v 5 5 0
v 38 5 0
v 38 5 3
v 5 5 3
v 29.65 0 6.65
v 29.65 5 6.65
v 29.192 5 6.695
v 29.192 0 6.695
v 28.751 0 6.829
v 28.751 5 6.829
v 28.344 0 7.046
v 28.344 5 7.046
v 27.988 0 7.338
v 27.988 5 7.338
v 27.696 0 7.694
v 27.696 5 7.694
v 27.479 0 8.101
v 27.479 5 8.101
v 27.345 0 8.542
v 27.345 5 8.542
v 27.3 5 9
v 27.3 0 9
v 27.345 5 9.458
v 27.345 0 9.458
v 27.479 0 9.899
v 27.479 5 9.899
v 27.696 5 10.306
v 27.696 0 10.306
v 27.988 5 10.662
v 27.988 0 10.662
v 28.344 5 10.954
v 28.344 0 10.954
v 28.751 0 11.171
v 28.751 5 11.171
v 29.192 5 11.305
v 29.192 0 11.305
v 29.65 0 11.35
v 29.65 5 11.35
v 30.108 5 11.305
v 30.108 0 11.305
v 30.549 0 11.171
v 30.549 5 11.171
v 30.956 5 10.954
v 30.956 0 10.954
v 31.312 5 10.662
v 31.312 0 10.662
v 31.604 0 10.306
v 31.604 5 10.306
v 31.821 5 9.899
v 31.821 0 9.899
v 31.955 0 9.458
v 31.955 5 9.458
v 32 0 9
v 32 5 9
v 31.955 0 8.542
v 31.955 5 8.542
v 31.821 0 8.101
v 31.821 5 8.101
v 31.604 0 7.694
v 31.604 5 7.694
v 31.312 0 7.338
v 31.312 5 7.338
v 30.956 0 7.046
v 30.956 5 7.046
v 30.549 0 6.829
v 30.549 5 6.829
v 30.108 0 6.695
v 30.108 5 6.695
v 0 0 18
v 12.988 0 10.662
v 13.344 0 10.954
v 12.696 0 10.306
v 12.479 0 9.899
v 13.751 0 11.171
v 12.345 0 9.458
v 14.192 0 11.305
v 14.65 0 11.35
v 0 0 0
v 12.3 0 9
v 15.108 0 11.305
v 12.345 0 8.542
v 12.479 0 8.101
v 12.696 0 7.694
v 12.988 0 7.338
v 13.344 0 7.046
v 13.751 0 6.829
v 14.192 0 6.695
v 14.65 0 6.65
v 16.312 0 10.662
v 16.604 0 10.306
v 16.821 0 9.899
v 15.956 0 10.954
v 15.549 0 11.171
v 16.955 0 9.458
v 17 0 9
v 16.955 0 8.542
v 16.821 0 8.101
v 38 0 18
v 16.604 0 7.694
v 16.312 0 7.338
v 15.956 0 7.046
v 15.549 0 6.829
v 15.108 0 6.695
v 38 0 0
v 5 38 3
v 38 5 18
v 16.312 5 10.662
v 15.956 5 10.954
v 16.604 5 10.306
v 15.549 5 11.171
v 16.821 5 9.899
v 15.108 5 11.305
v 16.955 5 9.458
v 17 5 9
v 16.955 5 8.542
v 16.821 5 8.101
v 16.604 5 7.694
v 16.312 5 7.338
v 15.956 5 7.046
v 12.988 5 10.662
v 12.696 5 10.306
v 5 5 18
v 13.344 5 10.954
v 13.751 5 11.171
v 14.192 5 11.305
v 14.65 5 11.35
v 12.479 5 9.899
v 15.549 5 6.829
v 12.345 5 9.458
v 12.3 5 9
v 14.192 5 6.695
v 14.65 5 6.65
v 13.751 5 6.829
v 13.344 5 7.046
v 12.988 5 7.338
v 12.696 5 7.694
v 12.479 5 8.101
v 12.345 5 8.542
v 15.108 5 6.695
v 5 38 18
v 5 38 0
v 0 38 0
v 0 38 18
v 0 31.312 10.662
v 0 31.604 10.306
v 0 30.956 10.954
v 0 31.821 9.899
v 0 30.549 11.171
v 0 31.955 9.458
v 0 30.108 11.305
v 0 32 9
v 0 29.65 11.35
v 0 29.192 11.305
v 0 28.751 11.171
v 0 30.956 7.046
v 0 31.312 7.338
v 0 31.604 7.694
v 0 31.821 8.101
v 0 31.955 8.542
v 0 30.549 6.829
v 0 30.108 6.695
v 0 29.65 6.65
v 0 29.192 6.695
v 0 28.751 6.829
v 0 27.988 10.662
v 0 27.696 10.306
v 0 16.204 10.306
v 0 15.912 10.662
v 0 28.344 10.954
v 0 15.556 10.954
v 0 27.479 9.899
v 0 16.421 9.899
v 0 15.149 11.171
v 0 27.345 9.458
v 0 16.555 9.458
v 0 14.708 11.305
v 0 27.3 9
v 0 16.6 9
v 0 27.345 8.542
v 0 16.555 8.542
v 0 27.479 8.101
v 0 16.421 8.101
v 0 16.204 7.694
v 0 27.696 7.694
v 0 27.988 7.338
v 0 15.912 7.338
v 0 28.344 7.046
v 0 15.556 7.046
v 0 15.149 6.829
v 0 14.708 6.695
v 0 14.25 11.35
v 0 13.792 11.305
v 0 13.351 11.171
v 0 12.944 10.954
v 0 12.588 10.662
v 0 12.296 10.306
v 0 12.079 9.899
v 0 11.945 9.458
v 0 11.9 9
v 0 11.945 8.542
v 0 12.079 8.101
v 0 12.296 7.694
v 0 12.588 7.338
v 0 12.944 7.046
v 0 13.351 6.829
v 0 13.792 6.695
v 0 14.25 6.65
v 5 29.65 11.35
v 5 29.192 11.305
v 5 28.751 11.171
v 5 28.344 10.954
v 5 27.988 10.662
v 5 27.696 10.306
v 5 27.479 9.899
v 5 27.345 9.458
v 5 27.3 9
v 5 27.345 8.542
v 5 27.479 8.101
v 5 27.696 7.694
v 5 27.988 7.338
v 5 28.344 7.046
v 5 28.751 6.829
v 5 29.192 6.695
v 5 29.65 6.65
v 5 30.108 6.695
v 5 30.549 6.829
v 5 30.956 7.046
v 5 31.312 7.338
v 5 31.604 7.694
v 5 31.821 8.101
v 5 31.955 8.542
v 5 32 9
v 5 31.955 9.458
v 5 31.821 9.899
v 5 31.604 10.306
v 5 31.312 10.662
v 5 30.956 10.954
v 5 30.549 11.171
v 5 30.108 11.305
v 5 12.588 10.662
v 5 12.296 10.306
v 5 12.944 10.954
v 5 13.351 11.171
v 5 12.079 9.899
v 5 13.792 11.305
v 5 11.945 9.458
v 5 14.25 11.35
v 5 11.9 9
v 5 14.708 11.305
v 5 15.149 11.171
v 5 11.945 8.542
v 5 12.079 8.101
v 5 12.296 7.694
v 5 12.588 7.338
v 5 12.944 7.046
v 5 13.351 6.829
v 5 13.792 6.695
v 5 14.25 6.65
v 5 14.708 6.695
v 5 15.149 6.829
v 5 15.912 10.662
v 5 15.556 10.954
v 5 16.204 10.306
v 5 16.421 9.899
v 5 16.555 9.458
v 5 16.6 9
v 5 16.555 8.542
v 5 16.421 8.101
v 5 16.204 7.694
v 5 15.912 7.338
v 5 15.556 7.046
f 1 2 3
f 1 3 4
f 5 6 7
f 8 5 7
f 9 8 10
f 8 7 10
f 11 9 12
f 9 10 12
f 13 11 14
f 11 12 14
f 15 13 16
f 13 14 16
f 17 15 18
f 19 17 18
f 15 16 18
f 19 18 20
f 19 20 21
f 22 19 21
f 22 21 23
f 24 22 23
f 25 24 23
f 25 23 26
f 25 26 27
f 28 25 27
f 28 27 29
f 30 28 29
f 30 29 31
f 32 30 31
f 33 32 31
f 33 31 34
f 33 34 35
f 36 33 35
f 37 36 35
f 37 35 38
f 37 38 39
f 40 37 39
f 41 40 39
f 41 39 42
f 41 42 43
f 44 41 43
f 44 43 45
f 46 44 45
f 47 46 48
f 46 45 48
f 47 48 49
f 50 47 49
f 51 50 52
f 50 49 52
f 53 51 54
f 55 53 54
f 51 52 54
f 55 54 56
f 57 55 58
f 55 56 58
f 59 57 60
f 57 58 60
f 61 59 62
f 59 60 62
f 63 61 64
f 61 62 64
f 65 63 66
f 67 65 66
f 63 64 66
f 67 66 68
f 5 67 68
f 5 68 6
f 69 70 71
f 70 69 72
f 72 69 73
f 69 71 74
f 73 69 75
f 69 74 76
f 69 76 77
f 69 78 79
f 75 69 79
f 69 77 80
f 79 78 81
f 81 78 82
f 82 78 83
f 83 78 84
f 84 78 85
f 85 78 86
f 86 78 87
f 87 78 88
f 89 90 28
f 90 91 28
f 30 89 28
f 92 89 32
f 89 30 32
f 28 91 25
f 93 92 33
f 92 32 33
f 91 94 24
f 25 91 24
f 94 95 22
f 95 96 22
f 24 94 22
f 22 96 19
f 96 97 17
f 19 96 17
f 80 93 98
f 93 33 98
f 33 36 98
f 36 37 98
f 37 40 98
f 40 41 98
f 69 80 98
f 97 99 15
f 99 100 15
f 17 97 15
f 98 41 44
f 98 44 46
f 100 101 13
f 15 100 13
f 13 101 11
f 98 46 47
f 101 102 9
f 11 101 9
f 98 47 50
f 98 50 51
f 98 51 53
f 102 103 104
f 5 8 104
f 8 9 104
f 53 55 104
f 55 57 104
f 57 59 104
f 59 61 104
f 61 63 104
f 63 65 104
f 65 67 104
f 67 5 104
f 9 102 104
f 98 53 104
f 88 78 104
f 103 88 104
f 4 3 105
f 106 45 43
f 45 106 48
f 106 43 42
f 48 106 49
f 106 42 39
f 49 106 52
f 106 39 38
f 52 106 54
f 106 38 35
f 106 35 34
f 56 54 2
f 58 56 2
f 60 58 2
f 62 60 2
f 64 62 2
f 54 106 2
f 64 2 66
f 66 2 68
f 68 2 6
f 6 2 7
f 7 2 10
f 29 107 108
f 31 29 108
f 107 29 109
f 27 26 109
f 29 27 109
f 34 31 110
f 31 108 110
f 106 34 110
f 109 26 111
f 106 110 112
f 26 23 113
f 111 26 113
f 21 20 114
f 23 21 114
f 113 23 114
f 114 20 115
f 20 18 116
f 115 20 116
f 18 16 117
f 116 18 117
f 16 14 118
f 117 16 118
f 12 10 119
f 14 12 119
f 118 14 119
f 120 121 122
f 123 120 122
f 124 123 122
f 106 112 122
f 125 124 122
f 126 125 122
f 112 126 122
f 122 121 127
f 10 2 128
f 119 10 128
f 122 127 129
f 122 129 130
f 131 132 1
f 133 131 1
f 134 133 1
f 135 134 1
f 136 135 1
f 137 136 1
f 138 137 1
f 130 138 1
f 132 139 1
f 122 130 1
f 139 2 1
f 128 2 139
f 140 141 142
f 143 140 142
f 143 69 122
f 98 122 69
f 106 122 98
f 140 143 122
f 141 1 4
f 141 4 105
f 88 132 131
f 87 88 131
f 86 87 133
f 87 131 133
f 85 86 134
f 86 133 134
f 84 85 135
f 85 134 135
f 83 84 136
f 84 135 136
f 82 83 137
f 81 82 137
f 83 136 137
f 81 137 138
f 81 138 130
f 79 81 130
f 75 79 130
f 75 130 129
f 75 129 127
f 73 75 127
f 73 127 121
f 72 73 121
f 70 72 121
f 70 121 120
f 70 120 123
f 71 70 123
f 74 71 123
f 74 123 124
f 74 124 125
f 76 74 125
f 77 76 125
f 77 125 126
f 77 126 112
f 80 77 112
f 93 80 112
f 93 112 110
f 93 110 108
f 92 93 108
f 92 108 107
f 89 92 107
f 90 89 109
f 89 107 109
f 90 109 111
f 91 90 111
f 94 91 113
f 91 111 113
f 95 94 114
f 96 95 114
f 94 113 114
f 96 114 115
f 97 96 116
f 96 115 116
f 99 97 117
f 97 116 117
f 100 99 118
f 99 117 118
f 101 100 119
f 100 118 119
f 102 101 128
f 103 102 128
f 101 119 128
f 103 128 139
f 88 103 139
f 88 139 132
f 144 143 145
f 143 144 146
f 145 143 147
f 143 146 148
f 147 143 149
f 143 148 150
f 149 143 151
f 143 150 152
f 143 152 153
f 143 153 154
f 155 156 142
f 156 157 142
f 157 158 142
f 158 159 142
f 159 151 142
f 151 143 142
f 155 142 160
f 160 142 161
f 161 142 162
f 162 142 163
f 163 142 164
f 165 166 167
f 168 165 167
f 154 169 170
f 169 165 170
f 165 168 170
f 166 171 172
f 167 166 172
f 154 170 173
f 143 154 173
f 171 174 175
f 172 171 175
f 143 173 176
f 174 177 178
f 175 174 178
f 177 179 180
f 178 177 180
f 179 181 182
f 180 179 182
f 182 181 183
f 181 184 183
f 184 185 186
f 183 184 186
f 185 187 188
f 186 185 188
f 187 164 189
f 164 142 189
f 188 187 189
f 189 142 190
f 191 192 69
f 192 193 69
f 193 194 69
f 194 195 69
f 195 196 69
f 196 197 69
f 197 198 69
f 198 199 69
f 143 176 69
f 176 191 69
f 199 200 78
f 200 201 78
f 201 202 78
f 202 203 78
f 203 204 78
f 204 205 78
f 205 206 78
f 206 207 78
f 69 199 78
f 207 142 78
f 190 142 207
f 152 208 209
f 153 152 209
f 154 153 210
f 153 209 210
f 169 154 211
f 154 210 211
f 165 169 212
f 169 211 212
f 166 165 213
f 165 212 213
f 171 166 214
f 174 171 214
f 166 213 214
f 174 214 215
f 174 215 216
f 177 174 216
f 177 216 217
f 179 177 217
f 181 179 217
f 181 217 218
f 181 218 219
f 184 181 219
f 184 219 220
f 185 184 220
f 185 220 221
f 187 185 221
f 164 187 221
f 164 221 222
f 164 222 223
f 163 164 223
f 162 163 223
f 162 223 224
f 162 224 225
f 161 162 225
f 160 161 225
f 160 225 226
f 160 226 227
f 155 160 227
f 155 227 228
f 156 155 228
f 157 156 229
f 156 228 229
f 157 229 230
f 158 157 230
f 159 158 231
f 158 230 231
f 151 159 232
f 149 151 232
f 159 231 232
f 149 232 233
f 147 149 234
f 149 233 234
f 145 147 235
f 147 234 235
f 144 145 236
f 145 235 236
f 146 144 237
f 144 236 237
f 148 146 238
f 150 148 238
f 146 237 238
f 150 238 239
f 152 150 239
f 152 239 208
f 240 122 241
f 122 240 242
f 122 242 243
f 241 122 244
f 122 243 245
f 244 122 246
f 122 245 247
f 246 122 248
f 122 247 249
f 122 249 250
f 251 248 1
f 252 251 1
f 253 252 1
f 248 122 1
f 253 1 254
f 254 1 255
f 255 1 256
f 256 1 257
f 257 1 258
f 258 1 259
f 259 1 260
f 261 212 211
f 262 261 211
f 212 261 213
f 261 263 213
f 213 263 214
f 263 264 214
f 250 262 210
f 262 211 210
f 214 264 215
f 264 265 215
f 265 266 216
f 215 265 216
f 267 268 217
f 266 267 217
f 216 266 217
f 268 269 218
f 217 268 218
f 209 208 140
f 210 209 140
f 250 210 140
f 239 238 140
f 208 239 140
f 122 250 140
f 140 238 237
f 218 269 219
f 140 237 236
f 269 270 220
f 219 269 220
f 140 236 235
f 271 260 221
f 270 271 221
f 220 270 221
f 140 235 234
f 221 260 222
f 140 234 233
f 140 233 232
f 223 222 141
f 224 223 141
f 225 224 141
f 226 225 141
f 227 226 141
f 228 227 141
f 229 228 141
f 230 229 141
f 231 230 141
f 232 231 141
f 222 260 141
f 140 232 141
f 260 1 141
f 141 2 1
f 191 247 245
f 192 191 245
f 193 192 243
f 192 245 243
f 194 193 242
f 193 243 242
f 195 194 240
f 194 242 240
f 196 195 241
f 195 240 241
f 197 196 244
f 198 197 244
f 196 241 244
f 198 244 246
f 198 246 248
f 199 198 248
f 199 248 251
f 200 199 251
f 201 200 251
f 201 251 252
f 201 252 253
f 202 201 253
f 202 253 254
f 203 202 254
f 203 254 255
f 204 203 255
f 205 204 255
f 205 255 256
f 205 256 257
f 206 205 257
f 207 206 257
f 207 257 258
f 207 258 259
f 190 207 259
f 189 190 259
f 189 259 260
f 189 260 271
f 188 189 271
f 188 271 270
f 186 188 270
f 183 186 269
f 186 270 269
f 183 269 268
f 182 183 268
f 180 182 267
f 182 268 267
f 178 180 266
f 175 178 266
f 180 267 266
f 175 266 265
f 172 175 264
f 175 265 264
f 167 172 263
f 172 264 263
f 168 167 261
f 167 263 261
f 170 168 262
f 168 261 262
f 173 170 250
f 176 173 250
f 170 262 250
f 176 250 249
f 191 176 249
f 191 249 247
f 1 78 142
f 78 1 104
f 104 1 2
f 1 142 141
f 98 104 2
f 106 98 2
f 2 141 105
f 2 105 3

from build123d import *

# Parameters (mm, degrees)
EXTRUDE_1_DEPTH          = 18
GUSSET_1_THICKNESS       = 3
SKETCH_4_R               = 2.35
CUT_EXTRUDE_1_DEPTH      = 12
CUT_EXTRUDE_1_DEPTH_BACK = 13
SKETCH_5_R               = 2.35
CUT_EXTRUDE_2_DEPTH      = 15
CUT_EXTRUDE_2_DEPTH_BACK = 12


with BuildPart() as part:
    # 草图1 → 凸台-拉伸1 (new body)
    with BuildSketch(Plane.XY):
        Polygon((0, 38), (0, 0), (38, 0), (38, 5), (5, 5), (5, 38), align=None)
    extrude(amount=EXTRUDE_1_DEPTH)

    # 草图4 → 切除-拉伸1 (cut, two sides)
    with BuildSketch(Plane(origin=(5, 0, 0), x_dir=(0, 0, -1), z_dir=(1, 0, 0))) as cut_extrude_1_sk:
        with Locations(Location((-9, 29.65, 0), (0, 0, 180))):
            Circle(SKETCH_4_R)
        with Locations(Location((-9, 14.25, 0), (0, 0, 180))):
            Circle(SKETCH_4_R)
    extrude(amount=CUT_EXTRUDE_1_DEPTH, mode=Mode.SUBTRACT)
    extrude(cut_extrude_1_sk.sketch, amount=-CUT_EXTRUDE_1_DEPTH_BACK, mode=Mode.SUBTRACT)

    # 草图5 → 切除-拉伸2 (cut, two sides)
    with BuildSketch(Plane(origin=(0, 5, 0), x_dir=(1, 0, 0), z_dir=(0, 1, 0))) as cut_extrude_2_sk:
        with Locations(Location((29.65, -9, 0), (0, 0, 90))):
            Circle(SKETCH_5_R)
        with Locations(Location((14.65, -9, 0), (0, 0, 90))):
            Circle(SKETCH_5_R)
    extrude(amount=CUT_EXTRUDE_2_DEPTH, mode=Mode.SUBTRACT)
    extrude(cut_extrude_2_sk.sketch, amount=-CUT_EXTRUDE_2_DEPTH_BACK, mode=Mode.SUBTRACT)


with BuildPart() as body_2:
    # Gusset 1: a gusset: a plate 3.0 thick in the corner of two members, its outline drawn in place
    gusset_1_outline = Wire([Line((5, 5, 0), (5, 38, 0)), Line((5, 38, 0), (38, 5, 0)), Line((38, 5, 0), (5, 5, 0))])
    add(extrude(Face(gusset_1_outline), amount=GUSSET_1_THICKNESS, dir=(0, 0, 1)))


solid = Compound([part.part, body_2.part])
